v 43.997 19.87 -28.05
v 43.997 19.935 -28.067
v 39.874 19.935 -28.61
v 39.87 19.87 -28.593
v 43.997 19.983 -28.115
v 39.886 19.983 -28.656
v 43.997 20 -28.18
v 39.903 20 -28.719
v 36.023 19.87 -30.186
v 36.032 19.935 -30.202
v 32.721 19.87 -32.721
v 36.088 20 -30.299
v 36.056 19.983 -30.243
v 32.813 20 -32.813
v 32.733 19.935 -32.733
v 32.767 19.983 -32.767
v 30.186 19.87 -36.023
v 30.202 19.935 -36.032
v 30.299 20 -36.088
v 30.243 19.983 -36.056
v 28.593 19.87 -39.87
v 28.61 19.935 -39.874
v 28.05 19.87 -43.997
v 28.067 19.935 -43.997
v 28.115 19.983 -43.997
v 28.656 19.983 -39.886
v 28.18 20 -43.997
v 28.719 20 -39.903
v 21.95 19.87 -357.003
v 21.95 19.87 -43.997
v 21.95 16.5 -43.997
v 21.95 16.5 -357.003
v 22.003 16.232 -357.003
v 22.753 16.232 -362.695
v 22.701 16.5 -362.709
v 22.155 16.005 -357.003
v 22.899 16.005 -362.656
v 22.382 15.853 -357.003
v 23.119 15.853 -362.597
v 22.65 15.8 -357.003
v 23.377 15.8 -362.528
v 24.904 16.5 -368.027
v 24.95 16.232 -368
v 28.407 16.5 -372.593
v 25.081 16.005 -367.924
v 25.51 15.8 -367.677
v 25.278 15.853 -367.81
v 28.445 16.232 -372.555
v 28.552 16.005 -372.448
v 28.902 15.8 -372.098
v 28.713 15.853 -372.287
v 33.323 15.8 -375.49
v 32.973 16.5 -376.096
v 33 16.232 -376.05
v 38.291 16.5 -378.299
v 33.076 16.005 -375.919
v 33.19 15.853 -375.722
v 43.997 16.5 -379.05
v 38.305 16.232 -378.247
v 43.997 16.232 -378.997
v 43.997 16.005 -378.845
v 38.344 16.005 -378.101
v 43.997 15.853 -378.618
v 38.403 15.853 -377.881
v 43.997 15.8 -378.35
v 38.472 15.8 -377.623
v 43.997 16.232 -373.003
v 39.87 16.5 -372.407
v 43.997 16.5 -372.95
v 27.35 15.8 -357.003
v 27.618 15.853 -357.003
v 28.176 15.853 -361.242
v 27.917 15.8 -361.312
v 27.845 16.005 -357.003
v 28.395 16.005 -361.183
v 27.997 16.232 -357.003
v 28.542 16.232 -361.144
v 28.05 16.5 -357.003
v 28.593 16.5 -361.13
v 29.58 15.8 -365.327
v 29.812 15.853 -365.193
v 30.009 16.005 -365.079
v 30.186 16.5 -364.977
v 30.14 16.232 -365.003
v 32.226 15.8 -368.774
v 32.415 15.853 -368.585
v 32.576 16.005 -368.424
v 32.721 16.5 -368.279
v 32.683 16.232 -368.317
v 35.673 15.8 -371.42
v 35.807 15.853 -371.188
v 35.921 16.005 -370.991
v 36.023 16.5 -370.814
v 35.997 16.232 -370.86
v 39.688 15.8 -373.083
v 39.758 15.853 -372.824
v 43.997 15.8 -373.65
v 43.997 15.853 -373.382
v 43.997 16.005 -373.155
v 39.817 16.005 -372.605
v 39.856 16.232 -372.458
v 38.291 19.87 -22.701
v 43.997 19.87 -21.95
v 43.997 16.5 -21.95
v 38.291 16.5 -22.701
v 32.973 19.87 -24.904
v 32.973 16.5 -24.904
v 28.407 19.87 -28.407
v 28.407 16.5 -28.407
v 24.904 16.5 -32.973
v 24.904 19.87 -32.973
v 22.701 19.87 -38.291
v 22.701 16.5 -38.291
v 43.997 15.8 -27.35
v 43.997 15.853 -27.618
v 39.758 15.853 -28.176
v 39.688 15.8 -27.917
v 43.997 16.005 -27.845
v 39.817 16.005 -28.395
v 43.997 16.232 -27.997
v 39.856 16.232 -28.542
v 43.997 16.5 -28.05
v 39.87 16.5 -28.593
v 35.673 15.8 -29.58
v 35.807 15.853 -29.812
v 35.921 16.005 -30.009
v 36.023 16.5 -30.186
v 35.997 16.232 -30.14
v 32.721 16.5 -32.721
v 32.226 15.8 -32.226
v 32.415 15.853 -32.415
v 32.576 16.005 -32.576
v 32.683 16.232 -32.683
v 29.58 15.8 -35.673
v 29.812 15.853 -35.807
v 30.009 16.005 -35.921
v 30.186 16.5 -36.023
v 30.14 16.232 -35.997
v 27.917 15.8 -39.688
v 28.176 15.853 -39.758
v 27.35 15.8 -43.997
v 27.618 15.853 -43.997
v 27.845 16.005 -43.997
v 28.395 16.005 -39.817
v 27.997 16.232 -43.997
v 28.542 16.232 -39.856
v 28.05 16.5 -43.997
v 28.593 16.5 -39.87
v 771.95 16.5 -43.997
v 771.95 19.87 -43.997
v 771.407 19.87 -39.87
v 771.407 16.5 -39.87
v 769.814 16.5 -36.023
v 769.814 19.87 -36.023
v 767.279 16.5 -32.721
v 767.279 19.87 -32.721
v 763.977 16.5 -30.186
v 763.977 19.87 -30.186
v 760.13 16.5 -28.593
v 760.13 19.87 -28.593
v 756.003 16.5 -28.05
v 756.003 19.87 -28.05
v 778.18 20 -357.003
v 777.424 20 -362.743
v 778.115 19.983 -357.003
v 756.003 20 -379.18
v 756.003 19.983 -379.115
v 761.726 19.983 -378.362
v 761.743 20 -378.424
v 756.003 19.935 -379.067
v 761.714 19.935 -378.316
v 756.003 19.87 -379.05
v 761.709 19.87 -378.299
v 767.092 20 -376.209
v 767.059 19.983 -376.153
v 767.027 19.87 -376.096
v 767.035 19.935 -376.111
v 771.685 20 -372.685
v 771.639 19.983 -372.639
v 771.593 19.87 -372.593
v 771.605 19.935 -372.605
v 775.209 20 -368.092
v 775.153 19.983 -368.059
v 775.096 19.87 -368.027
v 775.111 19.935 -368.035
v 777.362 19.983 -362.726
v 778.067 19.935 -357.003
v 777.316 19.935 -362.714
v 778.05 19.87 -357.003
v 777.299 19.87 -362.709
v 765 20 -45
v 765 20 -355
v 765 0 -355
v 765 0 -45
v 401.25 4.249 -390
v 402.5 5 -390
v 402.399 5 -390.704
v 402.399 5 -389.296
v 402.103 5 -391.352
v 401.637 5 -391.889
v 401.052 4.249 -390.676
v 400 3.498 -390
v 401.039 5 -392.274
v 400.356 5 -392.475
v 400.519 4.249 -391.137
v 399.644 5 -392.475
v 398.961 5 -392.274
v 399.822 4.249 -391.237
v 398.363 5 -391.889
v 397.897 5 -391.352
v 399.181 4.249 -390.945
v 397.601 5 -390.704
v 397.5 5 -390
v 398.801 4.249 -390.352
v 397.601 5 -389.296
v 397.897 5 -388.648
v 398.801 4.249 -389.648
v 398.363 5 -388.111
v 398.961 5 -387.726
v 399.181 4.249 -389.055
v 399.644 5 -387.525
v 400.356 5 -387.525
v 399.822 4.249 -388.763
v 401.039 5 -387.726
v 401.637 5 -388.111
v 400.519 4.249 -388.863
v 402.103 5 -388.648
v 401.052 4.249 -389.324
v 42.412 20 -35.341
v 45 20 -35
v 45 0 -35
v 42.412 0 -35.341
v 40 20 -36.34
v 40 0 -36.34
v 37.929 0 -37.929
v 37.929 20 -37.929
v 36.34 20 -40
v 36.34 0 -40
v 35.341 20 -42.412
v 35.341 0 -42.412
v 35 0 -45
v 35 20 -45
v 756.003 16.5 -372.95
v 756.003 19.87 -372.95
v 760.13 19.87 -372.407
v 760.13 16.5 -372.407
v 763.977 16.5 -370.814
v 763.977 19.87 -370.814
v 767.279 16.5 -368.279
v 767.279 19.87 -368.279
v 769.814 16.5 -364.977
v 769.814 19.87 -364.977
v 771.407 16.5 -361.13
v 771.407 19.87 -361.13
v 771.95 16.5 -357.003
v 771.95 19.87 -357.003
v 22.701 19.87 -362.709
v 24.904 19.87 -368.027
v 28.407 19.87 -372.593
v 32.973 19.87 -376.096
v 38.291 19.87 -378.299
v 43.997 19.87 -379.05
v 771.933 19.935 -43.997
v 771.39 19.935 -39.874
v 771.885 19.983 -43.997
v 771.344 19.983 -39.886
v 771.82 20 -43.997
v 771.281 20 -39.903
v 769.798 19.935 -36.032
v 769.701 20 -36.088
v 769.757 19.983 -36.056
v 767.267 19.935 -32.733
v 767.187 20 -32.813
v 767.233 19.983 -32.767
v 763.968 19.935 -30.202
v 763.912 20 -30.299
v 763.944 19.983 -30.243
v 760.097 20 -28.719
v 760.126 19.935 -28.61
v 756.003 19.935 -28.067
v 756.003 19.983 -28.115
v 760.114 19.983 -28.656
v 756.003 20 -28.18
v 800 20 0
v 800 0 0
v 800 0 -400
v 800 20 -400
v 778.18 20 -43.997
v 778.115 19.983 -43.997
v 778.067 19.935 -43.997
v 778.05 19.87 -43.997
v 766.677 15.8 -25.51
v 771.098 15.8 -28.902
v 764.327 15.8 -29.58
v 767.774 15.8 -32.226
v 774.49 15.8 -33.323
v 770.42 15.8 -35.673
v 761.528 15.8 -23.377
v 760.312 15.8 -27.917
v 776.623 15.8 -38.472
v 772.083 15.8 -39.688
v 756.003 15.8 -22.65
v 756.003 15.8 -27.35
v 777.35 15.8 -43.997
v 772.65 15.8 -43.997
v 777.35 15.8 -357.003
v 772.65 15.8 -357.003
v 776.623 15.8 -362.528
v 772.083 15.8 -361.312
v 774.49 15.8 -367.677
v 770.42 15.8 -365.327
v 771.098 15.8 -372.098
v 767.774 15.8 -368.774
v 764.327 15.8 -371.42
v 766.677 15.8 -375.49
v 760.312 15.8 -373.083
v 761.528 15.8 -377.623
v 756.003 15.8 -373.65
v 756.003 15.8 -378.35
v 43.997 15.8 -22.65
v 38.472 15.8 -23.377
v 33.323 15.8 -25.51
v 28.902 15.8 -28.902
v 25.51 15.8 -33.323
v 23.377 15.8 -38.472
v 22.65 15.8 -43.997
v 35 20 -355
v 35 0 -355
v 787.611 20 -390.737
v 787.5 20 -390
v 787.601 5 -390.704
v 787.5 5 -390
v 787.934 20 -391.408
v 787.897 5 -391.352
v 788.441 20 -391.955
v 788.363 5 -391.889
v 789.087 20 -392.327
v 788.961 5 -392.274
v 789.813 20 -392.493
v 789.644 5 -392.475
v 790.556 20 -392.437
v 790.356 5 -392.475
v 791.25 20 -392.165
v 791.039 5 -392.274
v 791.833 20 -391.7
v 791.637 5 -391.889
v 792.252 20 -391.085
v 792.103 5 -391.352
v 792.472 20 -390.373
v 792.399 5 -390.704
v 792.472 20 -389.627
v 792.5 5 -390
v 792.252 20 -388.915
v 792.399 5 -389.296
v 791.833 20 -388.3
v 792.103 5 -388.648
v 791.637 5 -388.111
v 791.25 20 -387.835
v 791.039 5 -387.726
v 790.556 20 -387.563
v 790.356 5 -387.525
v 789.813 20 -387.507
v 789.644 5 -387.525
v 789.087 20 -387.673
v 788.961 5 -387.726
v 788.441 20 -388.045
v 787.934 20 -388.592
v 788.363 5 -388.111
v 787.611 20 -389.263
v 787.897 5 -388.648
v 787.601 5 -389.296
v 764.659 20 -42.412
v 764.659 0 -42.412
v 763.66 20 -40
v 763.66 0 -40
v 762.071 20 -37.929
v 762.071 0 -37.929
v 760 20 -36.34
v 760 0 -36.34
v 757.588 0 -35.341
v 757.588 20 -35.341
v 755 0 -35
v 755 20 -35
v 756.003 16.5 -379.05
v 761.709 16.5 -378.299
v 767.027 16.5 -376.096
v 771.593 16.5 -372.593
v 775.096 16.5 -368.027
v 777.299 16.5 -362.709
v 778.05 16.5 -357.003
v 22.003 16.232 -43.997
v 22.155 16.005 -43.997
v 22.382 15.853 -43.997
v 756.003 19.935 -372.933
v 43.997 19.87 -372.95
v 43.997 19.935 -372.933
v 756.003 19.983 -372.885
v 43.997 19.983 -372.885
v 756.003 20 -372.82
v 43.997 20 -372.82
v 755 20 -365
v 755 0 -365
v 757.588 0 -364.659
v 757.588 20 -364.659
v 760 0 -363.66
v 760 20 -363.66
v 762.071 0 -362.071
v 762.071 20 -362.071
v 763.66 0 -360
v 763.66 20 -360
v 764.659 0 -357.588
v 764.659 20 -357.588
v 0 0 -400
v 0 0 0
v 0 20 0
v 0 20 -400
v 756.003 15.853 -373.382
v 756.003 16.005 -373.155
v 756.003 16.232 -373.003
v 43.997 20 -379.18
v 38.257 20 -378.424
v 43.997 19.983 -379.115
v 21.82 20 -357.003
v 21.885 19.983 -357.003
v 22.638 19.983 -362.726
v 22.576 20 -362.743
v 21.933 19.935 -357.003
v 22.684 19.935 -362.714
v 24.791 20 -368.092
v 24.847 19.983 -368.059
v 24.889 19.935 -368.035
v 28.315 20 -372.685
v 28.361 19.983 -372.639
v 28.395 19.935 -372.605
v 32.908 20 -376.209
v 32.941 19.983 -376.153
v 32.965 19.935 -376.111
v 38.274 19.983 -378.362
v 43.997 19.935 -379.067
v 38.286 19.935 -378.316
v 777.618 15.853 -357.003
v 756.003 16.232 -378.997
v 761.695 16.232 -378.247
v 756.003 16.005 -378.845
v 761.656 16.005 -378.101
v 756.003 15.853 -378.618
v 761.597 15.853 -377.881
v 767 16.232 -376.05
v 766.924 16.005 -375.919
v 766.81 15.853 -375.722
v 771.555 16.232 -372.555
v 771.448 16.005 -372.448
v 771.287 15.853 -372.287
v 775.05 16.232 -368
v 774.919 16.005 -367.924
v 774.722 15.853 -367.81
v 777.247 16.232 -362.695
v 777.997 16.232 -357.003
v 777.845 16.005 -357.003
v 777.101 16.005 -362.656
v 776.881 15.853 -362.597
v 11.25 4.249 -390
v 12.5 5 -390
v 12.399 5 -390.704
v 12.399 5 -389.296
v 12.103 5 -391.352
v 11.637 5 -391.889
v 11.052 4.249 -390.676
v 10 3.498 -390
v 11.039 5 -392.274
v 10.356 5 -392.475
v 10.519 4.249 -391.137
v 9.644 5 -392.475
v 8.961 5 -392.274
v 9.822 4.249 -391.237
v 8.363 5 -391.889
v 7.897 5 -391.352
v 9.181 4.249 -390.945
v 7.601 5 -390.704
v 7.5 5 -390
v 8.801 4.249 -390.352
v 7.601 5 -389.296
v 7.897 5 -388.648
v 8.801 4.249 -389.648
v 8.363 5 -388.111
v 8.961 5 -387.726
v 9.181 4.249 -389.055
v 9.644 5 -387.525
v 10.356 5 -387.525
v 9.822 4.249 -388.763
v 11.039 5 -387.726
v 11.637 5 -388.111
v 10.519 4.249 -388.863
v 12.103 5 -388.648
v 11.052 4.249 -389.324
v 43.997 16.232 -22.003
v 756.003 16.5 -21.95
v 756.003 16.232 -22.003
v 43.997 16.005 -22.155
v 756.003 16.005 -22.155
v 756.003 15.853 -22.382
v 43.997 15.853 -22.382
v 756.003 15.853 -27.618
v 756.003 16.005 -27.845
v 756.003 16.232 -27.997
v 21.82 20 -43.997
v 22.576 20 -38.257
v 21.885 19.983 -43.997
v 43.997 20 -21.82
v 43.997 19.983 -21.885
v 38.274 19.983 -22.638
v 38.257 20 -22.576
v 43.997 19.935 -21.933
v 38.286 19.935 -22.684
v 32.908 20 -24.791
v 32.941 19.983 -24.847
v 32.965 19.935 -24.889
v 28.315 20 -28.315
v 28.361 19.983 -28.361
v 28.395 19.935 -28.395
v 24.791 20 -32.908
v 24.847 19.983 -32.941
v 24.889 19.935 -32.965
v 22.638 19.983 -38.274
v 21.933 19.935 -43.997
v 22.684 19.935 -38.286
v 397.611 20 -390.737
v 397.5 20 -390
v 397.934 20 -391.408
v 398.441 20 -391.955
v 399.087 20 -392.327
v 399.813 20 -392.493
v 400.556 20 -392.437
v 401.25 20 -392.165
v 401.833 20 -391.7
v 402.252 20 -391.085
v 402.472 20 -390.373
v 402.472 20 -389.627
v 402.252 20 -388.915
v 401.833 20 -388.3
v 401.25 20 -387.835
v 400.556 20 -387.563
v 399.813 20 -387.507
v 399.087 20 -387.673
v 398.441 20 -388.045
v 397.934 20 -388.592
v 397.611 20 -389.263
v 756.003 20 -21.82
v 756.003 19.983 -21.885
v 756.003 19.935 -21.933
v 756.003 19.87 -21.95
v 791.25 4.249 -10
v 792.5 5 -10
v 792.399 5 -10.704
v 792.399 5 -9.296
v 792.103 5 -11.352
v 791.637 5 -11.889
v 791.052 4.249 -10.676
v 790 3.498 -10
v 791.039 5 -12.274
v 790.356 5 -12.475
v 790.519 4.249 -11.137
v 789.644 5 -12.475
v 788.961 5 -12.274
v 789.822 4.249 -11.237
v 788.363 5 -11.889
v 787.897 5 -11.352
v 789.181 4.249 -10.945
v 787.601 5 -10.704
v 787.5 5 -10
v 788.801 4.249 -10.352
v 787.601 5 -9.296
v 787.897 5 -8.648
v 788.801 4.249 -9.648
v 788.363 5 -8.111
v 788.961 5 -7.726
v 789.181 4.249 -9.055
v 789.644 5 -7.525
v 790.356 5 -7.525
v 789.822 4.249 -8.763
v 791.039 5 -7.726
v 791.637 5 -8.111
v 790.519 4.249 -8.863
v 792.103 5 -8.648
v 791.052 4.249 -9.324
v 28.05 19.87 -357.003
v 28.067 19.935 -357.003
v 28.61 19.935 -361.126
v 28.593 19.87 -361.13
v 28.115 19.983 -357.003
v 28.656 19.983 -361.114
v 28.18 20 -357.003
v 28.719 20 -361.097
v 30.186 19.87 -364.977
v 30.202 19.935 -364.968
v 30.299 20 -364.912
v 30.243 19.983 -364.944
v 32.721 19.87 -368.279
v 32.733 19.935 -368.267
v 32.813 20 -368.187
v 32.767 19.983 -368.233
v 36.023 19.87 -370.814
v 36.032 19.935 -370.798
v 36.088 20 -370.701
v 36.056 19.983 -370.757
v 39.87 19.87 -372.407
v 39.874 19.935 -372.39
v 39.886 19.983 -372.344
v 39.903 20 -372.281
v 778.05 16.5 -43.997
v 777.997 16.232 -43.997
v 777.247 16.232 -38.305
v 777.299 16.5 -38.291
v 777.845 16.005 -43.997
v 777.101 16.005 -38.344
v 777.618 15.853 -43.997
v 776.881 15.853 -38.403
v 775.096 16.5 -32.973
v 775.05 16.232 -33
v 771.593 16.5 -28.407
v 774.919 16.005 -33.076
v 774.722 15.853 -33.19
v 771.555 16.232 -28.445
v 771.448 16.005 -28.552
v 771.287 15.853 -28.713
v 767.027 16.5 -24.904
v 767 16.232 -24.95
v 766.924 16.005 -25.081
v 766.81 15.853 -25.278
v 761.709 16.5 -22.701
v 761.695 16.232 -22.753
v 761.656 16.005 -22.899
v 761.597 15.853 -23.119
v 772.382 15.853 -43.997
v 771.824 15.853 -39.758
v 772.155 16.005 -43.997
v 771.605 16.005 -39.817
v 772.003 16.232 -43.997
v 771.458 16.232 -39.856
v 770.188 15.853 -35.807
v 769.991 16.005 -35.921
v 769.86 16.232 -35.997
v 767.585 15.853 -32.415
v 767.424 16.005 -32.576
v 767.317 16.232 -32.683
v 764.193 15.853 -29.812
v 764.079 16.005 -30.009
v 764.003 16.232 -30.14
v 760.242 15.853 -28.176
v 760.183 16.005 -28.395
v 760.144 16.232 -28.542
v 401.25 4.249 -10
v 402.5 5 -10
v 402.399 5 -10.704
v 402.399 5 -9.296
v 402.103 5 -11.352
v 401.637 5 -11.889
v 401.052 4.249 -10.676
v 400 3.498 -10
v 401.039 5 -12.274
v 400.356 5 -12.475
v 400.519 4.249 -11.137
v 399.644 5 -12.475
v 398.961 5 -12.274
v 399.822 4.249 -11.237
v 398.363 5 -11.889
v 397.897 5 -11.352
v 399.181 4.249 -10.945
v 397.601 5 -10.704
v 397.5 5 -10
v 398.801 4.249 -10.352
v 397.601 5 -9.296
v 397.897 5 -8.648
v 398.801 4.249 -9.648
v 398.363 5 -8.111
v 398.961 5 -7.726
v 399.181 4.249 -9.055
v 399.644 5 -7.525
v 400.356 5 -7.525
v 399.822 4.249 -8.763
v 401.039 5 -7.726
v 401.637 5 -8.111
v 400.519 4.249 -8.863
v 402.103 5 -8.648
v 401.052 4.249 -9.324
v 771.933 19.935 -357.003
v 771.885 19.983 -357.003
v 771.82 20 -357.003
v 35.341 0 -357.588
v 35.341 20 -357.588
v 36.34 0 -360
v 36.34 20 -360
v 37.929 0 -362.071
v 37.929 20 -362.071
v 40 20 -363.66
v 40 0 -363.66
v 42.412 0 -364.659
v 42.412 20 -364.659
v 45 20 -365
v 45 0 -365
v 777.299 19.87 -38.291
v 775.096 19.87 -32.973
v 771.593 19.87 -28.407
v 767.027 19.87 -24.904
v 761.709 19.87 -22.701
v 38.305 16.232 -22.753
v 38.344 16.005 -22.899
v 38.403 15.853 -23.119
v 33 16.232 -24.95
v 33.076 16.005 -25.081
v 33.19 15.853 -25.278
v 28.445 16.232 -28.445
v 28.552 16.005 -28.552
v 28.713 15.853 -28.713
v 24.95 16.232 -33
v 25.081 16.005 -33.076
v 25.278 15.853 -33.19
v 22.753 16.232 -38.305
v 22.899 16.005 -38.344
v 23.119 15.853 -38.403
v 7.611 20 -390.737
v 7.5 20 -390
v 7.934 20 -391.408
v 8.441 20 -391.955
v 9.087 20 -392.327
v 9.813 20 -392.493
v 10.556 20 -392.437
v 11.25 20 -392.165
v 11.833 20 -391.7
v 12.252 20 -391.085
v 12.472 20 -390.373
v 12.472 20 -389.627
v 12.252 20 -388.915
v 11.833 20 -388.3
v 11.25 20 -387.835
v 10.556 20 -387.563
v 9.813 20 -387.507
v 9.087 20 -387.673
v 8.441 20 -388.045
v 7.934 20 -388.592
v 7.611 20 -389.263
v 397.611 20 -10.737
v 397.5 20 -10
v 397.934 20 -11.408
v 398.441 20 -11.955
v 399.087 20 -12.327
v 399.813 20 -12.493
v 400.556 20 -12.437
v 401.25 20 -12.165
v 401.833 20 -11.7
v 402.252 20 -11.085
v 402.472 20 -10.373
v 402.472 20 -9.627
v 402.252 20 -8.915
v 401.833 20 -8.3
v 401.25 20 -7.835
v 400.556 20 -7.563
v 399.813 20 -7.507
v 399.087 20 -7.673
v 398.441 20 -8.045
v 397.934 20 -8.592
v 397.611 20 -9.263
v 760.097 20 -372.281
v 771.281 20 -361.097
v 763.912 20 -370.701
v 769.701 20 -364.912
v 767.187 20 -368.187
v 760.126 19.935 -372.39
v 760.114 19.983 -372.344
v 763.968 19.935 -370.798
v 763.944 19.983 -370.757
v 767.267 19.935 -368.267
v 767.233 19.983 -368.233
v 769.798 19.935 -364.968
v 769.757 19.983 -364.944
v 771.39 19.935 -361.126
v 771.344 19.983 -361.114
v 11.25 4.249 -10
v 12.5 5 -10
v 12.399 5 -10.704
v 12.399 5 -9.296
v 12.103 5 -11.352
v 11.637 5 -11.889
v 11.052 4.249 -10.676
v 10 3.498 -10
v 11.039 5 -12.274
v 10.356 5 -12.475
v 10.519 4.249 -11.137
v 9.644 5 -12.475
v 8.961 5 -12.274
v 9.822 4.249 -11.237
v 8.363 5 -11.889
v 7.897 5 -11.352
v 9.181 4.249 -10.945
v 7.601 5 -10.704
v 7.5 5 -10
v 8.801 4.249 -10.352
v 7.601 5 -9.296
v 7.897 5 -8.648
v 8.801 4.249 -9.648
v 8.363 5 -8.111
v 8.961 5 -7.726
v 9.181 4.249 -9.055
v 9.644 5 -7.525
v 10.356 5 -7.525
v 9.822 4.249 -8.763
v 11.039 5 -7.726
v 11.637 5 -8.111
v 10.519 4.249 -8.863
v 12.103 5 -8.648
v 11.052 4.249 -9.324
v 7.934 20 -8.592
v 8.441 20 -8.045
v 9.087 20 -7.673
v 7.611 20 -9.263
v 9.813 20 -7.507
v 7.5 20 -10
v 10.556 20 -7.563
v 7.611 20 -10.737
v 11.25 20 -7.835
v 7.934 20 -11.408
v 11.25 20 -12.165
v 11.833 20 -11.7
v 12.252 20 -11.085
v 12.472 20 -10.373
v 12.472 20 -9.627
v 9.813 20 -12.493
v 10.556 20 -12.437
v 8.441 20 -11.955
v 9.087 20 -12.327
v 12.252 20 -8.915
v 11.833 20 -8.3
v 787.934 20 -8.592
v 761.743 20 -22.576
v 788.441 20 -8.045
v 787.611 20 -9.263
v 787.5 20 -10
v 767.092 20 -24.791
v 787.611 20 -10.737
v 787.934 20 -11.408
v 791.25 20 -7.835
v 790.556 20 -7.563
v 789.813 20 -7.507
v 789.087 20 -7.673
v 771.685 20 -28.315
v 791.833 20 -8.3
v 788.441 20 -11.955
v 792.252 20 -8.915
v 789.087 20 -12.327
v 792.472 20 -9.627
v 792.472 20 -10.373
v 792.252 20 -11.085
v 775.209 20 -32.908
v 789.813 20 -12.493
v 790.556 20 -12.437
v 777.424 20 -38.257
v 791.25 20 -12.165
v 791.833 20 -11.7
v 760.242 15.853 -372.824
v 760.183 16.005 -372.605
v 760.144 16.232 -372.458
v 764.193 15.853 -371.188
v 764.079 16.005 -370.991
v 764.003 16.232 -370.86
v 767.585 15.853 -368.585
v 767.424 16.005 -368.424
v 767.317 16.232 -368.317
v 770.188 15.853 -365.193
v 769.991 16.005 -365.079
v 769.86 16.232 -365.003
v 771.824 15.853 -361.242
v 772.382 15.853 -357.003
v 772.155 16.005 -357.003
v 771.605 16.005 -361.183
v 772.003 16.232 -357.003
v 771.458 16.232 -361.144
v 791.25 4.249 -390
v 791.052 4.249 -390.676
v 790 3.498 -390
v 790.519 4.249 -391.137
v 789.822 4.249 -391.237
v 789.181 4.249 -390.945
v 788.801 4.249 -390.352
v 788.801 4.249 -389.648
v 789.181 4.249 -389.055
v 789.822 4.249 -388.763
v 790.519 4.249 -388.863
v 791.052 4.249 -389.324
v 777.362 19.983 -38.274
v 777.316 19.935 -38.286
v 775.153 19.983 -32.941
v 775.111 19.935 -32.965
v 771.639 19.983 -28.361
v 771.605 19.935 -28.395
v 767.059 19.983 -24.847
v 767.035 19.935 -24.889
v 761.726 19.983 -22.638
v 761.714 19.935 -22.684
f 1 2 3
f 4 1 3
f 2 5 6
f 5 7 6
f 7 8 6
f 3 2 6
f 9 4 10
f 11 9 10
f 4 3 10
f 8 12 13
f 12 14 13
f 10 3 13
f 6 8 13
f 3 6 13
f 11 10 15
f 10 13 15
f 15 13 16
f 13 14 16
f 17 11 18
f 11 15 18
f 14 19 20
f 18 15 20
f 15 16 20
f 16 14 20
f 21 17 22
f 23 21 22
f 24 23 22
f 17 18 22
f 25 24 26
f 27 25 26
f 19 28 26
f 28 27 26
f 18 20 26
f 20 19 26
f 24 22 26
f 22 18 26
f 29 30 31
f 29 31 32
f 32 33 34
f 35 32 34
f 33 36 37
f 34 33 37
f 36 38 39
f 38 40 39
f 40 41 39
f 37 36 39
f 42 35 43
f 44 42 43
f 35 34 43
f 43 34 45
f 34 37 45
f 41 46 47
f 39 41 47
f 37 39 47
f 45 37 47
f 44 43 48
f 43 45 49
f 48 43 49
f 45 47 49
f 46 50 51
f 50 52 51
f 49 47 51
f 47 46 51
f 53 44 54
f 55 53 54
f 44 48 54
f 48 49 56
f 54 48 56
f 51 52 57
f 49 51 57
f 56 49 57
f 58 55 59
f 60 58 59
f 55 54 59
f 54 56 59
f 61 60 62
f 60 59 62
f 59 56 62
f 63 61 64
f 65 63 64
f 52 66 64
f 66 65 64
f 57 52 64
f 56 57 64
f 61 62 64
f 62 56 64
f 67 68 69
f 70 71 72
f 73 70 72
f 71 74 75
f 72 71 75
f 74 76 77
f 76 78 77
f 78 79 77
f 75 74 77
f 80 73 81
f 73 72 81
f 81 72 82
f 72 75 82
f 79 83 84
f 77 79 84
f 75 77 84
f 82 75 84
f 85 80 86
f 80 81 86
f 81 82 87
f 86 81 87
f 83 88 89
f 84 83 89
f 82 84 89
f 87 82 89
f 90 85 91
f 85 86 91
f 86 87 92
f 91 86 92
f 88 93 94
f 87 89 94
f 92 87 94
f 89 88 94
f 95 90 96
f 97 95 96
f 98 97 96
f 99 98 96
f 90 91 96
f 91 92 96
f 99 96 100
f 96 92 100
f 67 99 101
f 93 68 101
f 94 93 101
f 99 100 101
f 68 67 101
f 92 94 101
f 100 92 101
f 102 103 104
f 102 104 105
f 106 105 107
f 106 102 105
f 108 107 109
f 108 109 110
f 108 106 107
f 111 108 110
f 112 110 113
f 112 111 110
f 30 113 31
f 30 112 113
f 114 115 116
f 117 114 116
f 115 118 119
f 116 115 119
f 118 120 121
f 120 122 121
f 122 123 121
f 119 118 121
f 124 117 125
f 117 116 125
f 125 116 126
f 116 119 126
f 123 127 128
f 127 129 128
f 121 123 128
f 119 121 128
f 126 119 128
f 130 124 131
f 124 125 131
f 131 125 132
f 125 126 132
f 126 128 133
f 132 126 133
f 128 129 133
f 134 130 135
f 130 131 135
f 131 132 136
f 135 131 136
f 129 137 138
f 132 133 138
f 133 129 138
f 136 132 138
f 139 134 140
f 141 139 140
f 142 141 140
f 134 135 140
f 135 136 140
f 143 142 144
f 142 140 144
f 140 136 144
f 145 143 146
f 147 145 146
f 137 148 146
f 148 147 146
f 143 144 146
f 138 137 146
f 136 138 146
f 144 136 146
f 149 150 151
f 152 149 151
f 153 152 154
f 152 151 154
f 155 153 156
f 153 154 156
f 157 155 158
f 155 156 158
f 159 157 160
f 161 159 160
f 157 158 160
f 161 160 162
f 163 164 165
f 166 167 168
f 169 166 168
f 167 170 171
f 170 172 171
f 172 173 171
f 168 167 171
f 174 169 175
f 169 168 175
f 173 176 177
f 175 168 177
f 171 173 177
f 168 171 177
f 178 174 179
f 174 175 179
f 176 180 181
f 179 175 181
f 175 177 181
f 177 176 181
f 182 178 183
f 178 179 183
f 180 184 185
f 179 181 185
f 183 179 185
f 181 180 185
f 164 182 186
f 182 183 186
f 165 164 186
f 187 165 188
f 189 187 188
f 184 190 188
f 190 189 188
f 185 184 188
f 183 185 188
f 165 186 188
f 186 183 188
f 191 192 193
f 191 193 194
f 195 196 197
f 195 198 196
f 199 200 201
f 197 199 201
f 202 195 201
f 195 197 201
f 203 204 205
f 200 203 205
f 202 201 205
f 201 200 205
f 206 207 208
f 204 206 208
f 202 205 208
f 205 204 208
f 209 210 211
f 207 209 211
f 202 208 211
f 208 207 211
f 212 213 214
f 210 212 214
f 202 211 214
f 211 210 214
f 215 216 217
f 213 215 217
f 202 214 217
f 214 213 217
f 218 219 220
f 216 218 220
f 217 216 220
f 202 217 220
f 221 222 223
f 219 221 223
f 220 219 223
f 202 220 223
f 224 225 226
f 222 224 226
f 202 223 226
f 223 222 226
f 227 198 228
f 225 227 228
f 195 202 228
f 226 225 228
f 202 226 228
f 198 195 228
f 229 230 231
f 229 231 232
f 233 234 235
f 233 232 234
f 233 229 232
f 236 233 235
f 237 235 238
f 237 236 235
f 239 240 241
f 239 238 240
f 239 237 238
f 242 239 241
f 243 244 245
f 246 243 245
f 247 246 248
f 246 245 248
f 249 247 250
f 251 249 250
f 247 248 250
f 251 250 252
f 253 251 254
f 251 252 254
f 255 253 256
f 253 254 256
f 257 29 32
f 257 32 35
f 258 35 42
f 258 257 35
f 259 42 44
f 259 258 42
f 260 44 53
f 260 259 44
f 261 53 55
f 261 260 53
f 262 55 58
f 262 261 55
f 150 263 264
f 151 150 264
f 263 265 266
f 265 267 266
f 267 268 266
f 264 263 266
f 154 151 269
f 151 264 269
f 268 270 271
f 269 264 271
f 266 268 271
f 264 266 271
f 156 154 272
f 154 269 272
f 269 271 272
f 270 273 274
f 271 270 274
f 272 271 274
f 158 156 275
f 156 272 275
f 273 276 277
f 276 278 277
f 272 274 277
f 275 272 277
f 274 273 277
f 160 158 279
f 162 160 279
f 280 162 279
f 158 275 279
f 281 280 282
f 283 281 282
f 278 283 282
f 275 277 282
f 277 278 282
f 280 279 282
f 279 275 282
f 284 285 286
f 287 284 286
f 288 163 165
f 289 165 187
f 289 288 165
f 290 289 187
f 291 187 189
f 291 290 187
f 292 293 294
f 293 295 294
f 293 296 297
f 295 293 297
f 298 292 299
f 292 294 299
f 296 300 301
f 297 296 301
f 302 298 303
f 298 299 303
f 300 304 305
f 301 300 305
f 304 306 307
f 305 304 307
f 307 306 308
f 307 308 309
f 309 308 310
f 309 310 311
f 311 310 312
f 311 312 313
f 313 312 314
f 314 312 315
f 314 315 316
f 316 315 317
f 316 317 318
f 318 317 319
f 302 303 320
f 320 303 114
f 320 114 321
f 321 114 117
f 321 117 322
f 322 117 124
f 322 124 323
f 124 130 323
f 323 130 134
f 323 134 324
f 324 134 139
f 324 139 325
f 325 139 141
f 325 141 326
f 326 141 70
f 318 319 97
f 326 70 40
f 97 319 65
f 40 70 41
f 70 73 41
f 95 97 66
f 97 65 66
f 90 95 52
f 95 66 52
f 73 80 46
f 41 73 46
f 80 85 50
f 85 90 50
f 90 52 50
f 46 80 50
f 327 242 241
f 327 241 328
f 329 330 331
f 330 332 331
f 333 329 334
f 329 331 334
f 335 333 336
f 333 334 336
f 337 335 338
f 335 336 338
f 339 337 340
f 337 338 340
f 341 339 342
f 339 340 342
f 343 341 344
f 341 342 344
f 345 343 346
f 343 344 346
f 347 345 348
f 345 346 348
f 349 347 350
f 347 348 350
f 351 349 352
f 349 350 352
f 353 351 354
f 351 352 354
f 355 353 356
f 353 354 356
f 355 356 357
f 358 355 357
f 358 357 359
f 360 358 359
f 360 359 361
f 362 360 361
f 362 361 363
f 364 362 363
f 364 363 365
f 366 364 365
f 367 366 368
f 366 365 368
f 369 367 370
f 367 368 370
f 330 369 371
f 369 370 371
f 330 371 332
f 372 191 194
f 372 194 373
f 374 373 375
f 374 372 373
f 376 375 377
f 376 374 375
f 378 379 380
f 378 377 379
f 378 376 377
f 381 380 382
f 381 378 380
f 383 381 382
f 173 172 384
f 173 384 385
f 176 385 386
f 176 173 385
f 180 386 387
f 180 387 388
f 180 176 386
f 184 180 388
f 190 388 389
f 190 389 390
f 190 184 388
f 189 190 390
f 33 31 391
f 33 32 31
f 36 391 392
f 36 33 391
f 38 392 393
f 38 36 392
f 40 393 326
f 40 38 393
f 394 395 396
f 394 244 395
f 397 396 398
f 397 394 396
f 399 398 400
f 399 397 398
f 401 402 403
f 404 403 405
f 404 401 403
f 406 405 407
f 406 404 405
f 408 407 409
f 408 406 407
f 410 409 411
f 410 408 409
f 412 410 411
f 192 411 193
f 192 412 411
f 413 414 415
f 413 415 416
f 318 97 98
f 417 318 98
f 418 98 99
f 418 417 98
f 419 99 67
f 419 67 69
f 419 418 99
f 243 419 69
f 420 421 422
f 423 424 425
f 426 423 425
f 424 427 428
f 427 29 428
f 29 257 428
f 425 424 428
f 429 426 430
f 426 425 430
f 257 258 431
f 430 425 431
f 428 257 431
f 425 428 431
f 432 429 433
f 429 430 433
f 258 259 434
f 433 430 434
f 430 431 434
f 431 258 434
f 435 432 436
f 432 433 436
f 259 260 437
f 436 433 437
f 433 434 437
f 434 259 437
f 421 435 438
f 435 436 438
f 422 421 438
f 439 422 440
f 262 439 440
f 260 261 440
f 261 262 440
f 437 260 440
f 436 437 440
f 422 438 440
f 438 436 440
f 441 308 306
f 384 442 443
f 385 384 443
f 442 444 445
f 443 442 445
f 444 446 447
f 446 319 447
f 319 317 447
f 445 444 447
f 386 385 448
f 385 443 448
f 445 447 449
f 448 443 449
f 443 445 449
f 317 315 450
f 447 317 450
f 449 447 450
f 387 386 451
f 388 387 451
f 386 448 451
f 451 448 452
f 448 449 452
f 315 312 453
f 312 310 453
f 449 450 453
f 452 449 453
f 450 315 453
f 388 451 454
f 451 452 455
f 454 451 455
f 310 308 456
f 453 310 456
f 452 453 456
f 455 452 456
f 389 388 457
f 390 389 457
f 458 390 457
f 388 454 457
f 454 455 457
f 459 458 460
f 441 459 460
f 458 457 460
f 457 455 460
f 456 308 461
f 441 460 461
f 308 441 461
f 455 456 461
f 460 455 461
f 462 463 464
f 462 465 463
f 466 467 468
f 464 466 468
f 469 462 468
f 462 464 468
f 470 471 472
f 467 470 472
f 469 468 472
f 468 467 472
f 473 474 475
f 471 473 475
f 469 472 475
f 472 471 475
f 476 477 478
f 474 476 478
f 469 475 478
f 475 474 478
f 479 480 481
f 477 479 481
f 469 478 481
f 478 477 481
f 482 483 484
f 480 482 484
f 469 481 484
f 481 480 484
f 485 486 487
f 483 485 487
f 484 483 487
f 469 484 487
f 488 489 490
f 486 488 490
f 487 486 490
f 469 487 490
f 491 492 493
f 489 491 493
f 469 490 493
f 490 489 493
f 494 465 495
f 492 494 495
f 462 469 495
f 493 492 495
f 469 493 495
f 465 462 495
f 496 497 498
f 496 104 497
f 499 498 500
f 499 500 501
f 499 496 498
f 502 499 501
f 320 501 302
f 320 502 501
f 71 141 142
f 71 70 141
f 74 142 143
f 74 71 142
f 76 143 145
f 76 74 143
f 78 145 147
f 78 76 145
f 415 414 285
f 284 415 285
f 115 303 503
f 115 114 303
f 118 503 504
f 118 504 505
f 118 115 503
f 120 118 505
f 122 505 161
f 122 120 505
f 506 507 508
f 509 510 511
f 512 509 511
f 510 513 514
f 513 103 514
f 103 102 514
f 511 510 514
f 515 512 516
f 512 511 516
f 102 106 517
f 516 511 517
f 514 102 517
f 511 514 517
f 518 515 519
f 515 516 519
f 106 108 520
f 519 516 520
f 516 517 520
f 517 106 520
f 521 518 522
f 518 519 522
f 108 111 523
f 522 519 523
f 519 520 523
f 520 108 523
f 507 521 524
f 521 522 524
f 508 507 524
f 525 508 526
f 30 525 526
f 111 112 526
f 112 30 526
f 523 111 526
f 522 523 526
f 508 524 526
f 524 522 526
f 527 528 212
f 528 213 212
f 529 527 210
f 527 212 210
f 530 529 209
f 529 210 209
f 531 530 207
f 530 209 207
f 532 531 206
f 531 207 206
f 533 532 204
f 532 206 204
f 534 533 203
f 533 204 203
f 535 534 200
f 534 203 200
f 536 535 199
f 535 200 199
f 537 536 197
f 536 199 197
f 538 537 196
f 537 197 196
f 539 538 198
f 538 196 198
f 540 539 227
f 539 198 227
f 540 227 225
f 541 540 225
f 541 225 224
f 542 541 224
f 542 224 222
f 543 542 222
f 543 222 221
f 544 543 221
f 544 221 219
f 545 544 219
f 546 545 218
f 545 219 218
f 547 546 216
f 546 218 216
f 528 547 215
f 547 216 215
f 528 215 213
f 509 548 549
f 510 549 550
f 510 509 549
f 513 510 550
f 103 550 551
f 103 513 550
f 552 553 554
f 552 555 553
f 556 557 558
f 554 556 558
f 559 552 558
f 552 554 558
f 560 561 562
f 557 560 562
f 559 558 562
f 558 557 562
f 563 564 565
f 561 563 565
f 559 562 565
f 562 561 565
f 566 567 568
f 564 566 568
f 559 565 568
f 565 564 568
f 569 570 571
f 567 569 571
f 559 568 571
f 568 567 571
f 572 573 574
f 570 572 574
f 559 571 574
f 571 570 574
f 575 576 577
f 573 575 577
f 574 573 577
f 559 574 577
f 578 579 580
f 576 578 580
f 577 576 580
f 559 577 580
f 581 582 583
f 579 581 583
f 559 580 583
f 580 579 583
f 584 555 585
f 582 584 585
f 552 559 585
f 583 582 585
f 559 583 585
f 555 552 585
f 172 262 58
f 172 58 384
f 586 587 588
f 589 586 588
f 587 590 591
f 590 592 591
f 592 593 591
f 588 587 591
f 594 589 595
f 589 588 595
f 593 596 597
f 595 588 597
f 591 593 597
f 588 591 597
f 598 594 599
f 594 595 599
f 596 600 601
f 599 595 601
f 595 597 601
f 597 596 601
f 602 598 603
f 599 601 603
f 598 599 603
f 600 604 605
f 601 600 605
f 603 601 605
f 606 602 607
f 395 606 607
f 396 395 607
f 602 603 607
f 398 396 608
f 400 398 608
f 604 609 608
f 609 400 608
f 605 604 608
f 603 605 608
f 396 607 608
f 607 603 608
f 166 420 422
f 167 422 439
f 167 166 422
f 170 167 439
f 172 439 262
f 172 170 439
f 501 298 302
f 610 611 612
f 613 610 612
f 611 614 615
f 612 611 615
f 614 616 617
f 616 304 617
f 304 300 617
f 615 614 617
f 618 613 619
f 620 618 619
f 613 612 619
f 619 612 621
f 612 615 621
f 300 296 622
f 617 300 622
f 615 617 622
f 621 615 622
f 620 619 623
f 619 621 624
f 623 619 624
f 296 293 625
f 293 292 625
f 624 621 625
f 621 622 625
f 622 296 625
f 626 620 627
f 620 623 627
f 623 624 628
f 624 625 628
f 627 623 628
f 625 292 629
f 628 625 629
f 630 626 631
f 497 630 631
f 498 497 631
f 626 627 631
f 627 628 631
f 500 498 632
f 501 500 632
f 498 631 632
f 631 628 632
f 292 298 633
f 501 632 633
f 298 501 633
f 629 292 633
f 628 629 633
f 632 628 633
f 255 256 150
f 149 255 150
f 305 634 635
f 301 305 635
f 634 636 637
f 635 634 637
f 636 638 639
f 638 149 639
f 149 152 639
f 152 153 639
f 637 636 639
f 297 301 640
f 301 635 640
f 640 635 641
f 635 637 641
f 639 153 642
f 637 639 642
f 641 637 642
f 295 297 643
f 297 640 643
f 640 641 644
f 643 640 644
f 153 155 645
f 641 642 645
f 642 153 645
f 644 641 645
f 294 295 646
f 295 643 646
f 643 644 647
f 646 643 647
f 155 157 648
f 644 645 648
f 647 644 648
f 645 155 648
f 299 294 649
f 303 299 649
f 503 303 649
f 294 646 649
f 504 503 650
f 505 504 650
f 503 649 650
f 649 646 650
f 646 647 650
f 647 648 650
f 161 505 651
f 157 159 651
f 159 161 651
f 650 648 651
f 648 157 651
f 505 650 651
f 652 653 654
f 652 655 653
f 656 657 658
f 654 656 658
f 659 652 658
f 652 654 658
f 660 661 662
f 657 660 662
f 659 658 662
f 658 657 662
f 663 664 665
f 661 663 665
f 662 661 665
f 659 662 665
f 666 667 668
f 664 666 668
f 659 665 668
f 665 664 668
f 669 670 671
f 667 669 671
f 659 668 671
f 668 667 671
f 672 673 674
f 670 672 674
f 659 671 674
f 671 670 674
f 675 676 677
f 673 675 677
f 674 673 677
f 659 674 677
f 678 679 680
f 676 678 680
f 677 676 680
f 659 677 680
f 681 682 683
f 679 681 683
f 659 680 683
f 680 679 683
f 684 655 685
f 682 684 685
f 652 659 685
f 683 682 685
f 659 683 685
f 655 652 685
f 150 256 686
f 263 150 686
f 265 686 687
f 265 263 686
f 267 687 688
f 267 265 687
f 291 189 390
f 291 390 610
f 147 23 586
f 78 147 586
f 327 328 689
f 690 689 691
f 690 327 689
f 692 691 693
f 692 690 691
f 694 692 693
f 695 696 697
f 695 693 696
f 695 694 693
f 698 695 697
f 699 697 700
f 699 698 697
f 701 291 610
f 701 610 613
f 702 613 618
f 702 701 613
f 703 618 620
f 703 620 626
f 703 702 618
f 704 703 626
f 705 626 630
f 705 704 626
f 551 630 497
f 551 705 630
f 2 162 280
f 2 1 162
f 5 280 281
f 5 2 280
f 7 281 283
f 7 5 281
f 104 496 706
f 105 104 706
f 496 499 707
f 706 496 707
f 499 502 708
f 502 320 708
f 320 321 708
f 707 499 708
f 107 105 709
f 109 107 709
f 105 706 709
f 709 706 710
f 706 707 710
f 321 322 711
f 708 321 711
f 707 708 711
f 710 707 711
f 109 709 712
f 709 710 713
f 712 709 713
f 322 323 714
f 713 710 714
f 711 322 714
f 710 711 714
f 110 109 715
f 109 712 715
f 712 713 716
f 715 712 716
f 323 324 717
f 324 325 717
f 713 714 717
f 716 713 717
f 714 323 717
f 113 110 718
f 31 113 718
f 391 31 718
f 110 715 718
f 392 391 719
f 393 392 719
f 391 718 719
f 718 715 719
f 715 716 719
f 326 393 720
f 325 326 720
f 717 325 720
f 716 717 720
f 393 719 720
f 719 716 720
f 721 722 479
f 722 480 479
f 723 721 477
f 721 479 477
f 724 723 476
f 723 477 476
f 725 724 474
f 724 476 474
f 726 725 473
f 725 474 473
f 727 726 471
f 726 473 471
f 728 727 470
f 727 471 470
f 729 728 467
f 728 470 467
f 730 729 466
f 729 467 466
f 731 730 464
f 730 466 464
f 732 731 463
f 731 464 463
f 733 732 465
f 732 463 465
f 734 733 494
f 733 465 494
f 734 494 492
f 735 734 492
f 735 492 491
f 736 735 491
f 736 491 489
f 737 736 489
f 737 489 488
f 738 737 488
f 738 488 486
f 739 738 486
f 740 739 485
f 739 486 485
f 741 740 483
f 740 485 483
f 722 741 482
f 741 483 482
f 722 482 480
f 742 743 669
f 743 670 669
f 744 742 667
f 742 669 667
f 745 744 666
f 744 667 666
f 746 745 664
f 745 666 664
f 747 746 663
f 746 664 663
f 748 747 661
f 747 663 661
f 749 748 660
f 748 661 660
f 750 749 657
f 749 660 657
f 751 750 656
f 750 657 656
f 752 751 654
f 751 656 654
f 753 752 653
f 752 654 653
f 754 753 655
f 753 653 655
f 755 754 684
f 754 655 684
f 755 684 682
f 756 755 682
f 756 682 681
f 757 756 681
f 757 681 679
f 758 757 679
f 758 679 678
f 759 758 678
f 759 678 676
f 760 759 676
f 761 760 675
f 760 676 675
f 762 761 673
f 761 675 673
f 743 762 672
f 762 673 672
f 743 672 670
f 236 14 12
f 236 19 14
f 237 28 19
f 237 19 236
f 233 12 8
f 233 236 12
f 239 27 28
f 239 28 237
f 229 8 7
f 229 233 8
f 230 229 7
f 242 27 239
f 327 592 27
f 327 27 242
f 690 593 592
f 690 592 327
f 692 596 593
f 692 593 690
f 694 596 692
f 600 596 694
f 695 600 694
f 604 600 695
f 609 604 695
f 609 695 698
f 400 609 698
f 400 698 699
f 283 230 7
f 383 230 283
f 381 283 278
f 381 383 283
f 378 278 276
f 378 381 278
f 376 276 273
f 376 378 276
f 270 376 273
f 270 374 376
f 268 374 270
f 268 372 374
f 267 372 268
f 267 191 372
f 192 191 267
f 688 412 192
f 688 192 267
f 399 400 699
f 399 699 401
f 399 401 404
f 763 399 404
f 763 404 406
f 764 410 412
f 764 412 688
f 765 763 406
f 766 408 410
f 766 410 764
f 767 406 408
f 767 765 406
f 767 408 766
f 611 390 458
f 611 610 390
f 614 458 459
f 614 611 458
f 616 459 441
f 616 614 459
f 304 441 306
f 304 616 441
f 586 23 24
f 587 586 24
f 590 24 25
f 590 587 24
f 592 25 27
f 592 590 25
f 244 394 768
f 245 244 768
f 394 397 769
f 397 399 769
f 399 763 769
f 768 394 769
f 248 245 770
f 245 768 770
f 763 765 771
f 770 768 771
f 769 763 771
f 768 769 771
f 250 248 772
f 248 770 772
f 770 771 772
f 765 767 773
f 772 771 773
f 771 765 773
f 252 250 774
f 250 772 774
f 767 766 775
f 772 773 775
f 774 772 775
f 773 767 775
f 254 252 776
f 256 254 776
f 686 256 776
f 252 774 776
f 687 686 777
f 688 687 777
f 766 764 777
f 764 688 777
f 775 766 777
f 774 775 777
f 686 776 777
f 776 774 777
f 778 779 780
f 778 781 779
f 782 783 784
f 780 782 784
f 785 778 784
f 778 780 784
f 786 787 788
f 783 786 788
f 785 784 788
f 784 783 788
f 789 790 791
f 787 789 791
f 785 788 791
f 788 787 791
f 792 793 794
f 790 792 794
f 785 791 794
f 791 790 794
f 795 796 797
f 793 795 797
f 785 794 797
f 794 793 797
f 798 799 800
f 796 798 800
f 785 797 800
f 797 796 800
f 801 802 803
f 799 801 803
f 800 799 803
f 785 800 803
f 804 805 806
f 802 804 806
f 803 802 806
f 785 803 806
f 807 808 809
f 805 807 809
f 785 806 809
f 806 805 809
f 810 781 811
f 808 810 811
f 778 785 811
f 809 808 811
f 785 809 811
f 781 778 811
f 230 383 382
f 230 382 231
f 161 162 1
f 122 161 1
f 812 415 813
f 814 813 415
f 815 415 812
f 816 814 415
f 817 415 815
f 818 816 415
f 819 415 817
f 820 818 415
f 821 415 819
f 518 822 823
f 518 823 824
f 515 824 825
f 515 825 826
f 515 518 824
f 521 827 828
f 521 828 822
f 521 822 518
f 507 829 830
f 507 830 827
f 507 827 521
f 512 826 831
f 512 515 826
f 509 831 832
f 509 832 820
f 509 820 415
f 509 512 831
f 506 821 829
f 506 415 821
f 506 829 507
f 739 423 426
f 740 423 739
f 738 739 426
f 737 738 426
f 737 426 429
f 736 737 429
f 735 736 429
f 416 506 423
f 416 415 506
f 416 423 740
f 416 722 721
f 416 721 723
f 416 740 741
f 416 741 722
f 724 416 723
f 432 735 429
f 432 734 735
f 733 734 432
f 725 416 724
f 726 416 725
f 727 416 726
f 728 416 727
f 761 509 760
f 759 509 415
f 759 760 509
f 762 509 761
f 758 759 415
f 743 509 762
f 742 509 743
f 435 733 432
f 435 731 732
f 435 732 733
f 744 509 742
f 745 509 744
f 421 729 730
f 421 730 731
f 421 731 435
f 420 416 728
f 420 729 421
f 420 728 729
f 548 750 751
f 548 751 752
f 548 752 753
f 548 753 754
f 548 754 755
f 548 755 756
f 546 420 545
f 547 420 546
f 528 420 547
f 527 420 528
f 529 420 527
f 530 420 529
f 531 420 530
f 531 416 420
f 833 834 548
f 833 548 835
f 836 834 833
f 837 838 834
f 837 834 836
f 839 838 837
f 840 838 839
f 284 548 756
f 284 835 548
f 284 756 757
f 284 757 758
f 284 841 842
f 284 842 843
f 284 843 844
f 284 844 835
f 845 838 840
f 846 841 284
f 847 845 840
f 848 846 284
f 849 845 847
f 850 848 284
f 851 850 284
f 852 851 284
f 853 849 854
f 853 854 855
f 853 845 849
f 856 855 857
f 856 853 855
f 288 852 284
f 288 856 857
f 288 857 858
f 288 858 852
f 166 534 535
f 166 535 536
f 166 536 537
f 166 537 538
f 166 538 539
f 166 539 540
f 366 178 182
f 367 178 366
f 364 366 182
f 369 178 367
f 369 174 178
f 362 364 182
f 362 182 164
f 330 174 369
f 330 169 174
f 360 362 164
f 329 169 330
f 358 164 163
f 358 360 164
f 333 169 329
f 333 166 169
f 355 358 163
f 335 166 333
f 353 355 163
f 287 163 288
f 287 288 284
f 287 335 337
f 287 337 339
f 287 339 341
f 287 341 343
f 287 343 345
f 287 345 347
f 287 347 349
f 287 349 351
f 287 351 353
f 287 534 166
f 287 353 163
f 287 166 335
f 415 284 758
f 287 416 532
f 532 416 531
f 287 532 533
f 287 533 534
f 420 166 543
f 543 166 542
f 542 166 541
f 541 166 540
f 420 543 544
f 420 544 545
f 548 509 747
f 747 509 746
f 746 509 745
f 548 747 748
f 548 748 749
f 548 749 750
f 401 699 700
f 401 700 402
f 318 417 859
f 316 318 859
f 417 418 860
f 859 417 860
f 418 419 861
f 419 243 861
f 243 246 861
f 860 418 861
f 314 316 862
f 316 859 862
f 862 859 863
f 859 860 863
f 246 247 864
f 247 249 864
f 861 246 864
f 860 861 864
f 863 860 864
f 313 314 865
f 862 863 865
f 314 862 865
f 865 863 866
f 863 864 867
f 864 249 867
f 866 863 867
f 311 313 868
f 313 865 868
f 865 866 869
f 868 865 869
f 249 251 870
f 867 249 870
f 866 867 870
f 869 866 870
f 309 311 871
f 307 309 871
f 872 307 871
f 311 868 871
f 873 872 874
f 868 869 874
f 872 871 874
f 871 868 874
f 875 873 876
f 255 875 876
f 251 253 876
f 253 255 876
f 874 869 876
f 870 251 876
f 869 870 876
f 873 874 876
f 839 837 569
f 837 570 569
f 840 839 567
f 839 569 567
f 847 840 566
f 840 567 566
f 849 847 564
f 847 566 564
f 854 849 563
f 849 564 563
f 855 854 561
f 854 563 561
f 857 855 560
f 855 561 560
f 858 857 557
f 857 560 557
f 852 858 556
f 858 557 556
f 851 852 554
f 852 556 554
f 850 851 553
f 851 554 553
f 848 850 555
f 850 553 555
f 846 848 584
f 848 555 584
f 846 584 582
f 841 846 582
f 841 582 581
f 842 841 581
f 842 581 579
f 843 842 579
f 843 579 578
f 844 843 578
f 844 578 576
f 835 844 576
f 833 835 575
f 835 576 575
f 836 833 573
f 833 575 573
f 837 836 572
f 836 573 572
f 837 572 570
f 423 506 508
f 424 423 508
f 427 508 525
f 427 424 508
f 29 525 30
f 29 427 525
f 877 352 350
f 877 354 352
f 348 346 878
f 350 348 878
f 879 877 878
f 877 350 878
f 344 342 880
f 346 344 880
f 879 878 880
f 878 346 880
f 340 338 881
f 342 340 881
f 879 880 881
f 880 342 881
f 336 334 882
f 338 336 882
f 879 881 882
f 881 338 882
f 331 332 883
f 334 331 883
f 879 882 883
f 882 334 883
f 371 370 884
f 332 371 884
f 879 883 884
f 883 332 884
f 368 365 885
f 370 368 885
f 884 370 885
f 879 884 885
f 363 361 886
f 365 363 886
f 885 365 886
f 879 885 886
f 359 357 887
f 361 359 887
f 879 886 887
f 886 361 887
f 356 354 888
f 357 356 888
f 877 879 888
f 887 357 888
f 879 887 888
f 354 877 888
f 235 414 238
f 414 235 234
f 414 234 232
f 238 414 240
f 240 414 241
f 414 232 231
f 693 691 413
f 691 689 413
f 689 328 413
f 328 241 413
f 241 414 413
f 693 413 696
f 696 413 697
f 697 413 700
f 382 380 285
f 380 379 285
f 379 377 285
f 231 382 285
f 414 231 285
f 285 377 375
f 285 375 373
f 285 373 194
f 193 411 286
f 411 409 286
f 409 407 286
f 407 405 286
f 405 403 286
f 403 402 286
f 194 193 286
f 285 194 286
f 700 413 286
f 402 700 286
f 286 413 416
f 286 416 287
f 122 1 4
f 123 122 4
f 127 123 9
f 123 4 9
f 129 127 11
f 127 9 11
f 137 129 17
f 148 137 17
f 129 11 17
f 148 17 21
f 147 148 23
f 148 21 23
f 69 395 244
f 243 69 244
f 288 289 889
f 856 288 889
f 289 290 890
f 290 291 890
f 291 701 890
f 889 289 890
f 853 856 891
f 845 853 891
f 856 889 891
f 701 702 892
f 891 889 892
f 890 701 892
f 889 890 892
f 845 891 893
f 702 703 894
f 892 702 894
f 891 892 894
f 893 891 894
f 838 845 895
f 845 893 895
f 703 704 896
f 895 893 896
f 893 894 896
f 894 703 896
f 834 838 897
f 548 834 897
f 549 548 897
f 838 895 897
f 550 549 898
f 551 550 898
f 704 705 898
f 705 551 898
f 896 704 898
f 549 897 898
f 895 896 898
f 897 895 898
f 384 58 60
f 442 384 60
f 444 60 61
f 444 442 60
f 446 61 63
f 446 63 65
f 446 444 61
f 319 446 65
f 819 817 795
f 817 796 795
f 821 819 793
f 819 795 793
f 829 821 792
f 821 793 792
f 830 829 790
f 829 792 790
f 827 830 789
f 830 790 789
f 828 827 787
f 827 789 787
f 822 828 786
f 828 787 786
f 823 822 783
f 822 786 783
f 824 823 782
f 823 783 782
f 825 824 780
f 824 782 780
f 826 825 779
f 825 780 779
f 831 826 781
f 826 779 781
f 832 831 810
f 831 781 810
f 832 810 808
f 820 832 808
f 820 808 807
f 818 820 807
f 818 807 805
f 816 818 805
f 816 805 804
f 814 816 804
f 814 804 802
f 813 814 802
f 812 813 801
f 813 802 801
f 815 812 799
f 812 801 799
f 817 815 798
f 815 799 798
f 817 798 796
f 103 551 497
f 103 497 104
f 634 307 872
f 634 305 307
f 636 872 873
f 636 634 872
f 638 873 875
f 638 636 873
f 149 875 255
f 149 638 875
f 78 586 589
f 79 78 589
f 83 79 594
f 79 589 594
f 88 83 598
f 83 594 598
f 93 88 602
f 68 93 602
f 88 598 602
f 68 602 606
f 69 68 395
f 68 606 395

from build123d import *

# Parameters (mm, degrees)
SKETCH_1_W             = 800
SKETCH_1_H             = 400
EXTRUDE_1_DEPTH        = 20
CUT_EXTRUDE_1_DEPTH    = 4.2
FILLET_1_R             = 0.13
FILLET_2_R             = 0.7
CUT_EXTRUDE_2_DEPTH    = 895.650769854
HOLE_WIZARD_M6_1_D     = 5
HOLE_WIZARD_M6_1_DEPTH = 15
HOLE_WIZARD_M6_1_TIP   = 1.502151548


with BuildPart() as part:
    # 스케치1 → 보스-돌출1 (new body)
    with BuildSketch(Plane(origin=(0, 0, 0), x_dir=(1, 0, 0), z_dir=(0, 1, 0))):
        with Locations((400, 200)):
            Rectangle(SKETCH_1_W, SKETCH_1_H)
    extrude(amount=EXTRUDE_1_DEPTH)

    # 스케치2 → 컷-돌출1 (cut)
    with BuildSketch(Plane(origin=(0, 20, 0), x_dir=(1, 0, 0), z_dir=(0, 1, 0))):
        with BuildLine():
            Line((43.996963872, 379.05), (756.003036128, 379.05))
            ThreePointArc((756.003036128, 379.05), (771.592593786, 372.592593786), (778.05, 357.003036128))
            Line((778.05, 357.003036128), (778.05, 43.996963872))
            ThreePointArc((778.05, 43.996963872), (771.592593786, 28.407406214), (756.003036128, 21.95))
            Line((756.003036128, 21.95), (43.996963872, 21.95))
            ThreePointArc((43.996963872, 21.95), (28.407406214, 28.407406214), (21.95, 43.996963872))
            Line((21.95, 43.996963872), (21.95, 357.003036128))
            ThreePointArc((21.95, 357.003036128), (28.407406214, 372.592593786), (43.996963872, 379.05))
        make_face()
        with BuildLine():
            Line((43.996963872, 372.95), (756.003036128, 372.95))
            ThreePointArc((756.003036128, 372.95), (767.279242421, 368.279242421), (771.95, 357.003036128))
            Line((771.95, 357.003036128), (771.95, 43.996963872))
            ThreePointArc((771.95, 43.996963872), (767.279242421, 32.720757579), (756.003036128, 28.05))
            Line((756.003036128, 28.05), (43.996963872, 28.05))
            ThreePointArc((43.996963872, 28.05), (32.720757579, 32.720757579), (28.05, 43.996963872))
            Line((28.05, 43.996963872), (28.05, 357.003036128))
            ThreePointArc((28.05, 357.003036128), (32.720757579, 368.279242421), (43.996963872, 372.95))
        make_face(mode=Mode.SUBTRACT)
    extrude(amount=-CUT_EXTRUDE_1_DEPTH, mode=Mode.SUBTRACT)

    # 필렛1
    fillet_1_edges = [part.edges().sort_by_distance(p)[0] for p in [
        (28.407406214, 20, -372.592593786),
        (21.95, 20, -200.5),
        (28.407406214, 20, -28.407406214),
        (400, 20, -21.95),
        (771.592593786, 20, -28.407406214),
        (778.05, 20, -200.5),
        (771.592593786, 20, -372.592593786),
        (400, 20, -379.05),
        (32.720757579, 20, -368.279242421),
        (400, 20, -372.95),
        (767.279242421, 20, -368.279242421),
        (771.95, 20, -200.5),
        (767.279242421, 20, -32.720757579),
        (400, 20, -28.05),
        (32.720757579, 20, -32.720757579),
        (28.05, 20, -200.5),
    ]]
    fillet(fillet_1_edges, radius=FILLET_1_R)

    # 필렛2
    fillet_2_edges = [part.edges().sort_by_distance(p)[0] for p in [
        (28.407406214, 15.8, -372.592593786),
        (400, 15.8, -379.05),
        (771.592593786, 15.8, -372.592593786),
        (778.05, 15.8, -200.5),
        (771.592593786, 15.8, -28.407406214),
        (400, 15.8, -21.95),
        (28.407406214, 15.8, -28.407406214),
        (21.95, 15.8, -200.5),
        (400, 15.8, -372.95),
        (32.720757579, 15.8, -368.279242421),
        (28.05, 15.8, -200.5),
        (32.720757579, 15.8, -32.720757579),
        (400, 15.8, -28.05),
        (767.279242421, 15.8, -32.720757579),
        (771.95, 15.8, -200.5),
        (767.279242421, 15.8, -368.279242421),
    ]]
    fillet(fillet_2_edges, radius=FILLET_2_R)

    # 스케치3 → 컷-돌출2 (cut, through all)
    with BuildSketch(Plane(origin=(0, 20, 0), x_dir=(1, 0, 0), z_dir=(0, 1, 0))):
        with BuildLine():
            Line((45, 365), (755, 365))
            ThreePointArc((755, 365), (762.071067812, 362.071067812), (765, 355))
            Line((765, 355), (765, 45))
            ThreePointArc((765, 45), (762.071067812, 37.928932188), (755, 35))
            Line((755, 35), (45, 35))
            ThreePointArc((45, 35), (37.928932188, 37.928932188), (35, 45))
            Line((35, 45), (35, 355))
            ThreePointArc((35, 355), (37.928932188, 362.071067812), (45, 365))
        make_face()
    extrude(amount=-CUT_EXTRUDE_2_DEPTH, mode=Mode.SUBTRACT)

    # M6 나사 구멍1
    with Locations(Plane(origin=(0, 20, 0), x_dir=(1, 0, 0), z_dir=(0, 1, 0))):
        with Locations((10, 10), (10, 390), (790, 390), (790, 10), (400, 390), (400, 10)):
            Hole(HOLE_WIZARD_M6_1_D / 2, depth=HOLE_WIZARD_M6_1_DEPTH)
            with Locations((0, 0, -(HOLE_WIZARD_M6_1_DEPTH + HOLE_WIZARD_M6_1_TIP / 2))):  # 118° drill point
                Cone(0, HOLE_WIZARD_M6_1_D / 2, HOLE_WIZARD_M6_1_TIP, mode=Mode.SUBTRACT)


solid = part.part
